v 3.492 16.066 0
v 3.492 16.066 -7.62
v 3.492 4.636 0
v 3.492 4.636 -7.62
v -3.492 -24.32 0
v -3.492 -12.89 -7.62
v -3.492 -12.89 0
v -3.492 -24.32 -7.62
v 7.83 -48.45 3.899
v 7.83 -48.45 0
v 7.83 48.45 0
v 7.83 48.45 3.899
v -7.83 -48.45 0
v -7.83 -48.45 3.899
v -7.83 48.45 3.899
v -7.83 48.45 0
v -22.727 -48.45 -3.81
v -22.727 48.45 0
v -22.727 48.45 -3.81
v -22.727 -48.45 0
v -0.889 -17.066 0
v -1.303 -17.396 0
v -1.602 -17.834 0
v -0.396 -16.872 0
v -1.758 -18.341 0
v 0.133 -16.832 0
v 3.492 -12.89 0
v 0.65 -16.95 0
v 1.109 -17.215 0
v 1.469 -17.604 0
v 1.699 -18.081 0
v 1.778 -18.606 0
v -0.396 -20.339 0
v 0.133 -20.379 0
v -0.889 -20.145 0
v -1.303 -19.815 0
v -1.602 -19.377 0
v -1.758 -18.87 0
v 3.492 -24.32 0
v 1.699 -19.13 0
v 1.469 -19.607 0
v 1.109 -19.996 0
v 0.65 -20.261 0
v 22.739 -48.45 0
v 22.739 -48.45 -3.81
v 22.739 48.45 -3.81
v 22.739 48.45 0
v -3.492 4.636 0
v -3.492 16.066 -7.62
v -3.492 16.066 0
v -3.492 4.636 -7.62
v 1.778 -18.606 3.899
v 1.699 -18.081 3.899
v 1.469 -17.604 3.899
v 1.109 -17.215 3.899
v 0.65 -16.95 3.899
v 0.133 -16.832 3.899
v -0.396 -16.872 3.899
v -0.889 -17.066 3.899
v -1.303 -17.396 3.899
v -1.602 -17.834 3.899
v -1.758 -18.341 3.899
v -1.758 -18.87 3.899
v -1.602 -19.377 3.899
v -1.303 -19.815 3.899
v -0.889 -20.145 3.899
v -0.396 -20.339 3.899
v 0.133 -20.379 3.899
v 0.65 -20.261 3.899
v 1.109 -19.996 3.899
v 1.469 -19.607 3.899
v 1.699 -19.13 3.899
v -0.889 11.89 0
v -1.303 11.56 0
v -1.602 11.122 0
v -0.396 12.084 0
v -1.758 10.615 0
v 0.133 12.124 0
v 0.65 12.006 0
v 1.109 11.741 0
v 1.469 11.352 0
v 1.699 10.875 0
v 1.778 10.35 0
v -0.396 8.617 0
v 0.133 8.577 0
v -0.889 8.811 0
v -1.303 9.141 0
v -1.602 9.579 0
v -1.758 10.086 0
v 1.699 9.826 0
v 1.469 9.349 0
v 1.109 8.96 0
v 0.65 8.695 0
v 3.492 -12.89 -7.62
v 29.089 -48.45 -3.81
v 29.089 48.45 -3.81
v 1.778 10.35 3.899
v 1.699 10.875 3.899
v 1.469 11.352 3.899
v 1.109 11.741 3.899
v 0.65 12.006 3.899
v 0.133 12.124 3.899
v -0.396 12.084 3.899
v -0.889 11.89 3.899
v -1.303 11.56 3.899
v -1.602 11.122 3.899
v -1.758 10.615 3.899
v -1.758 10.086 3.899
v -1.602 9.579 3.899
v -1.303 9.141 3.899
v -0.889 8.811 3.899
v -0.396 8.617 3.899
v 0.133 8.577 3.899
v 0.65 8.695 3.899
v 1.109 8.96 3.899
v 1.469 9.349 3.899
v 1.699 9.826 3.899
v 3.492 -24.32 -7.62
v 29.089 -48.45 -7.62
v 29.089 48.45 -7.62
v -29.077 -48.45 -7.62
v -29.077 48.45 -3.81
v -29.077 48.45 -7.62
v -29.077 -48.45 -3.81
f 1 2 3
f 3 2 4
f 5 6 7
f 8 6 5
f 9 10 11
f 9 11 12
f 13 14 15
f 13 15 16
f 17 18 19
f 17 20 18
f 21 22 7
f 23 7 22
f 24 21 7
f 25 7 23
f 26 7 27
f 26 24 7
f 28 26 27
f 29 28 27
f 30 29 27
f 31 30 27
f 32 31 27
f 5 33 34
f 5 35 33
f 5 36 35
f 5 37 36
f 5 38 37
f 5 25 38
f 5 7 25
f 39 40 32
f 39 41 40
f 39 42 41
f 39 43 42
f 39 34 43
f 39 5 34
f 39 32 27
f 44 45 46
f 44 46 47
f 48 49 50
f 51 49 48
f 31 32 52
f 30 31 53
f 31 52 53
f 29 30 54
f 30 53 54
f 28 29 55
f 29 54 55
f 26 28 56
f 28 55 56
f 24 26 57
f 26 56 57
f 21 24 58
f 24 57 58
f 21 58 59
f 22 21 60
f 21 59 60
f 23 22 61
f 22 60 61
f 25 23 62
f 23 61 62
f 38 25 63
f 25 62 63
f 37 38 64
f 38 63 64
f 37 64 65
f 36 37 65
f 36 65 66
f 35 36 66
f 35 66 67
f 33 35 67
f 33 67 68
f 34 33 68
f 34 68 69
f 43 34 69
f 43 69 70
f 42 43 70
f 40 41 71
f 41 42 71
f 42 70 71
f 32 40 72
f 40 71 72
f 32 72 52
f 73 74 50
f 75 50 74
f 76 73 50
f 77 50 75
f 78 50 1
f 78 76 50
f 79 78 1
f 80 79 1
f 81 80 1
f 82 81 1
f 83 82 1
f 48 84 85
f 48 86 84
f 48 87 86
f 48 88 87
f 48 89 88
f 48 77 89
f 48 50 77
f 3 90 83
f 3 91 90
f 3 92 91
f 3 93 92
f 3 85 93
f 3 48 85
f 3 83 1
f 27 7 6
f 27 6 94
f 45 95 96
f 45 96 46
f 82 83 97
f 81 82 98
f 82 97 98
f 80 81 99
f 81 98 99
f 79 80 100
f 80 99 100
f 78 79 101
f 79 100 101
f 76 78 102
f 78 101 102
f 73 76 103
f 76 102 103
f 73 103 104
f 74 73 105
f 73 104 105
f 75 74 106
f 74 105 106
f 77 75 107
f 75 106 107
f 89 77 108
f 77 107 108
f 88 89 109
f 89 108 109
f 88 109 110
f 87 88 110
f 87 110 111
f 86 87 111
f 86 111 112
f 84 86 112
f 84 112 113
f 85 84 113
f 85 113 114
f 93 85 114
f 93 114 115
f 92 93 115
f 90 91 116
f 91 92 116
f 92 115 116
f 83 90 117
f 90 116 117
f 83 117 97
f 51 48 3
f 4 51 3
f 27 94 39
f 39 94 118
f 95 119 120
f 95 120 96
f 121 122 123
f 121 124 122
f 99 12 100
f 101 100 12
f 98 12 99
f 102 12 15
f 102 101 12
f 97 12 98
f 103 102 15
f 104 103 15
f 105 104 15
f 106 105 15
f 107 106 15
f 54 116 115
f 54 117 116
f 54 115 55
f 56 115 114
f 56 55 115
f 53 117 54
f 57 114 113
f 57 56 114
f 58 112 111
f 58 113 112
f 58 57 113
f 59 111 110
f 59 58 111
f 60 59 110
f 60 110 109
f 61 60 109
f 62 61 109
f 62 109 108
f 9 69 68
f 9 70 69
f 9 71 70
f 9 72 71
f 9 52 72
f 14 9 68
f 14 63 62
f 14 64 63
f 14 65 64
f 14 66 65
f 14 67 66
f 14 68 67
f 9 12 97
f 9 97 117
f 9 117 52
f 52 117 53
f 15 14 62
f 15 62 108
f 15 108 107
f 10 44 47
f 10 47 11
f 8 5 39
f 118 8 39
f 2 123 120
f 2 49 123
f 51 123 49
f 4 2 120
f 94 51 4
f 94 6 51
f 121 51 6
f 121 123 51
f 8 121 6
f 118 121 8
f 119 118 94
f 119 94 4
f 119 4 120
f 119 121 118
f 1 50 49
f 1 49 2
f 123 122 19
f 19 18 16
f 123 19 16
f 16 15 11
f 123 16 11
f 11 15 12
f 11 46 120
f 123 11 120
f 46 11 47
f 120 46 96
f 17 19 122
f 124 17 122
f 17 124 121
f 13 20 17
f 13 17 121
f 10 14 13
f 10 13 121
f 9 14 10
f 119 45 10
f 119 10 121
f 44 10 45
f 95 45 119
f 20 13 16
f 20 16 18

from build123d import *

# Parameters (mm, degrees)
F1_DEPTH = 48.4505
F2_R     = 1.778
F3_DEPTH = 11.5199
F4_W     = 6.985
F4_H     = 11.43
F4_R     = 1.778
F5_DEPTH = 7.62


with BuildPart() as f1:
    # F0 (on Front) → F1 (new body, symmetric)
    with BuildSketch(Plane.XZ):
        Polygon((-29.07665, -3.81), (-29.07665, -7.62), (29.08935, -7.62), (29.08935, -3.81), (22.73935, -3.81), (22.73935, 0), (7.82955, 0), (7.82955, 3.8989), (-7.82955, 3.8989), (-7.82955, 0), (-22.72665, 0), (-22.72665, -3.81), align=None)
    extrude(amount=F1_DEPTH, both=True)

    # F2 (on face) → F3 (cut, through all)
    with BuildSketch(Plane.XY.offset(3.8989)):
        with Locations((0, 10.3505)):
            Circle(F2_R)
        with Locations((0, -18.6055)):
            Circle(F2_R)
    extrude(amount=-F3_DEPTH, mode=Mode.SUBTRACT)

    # F4 (on face) → F5 (cut, through all)
    with BuildSketch(Plane(origin=(0, 0, -7.62), x_dir=(1, 0, 0), z_dir=(0, 0, -1))):
        with Locations((0, 18.6055)):
            Rectangle(F4_W, F4_H)
        with Locations((0, 18.6055)):
            Circle(F4_R, mode=Mode.SUBTRACT)
        with Locations((0, -10.3505)):
            Rectangle(F4_W, F4_H)
        with Locations((0, -10.3505)):
            Circle(F4_R, mode=Mode.SUBTRACT)
    extrude(amount=-F5_DEPTH, mode=Mode.SUBTRACT)


solid = f1.part
